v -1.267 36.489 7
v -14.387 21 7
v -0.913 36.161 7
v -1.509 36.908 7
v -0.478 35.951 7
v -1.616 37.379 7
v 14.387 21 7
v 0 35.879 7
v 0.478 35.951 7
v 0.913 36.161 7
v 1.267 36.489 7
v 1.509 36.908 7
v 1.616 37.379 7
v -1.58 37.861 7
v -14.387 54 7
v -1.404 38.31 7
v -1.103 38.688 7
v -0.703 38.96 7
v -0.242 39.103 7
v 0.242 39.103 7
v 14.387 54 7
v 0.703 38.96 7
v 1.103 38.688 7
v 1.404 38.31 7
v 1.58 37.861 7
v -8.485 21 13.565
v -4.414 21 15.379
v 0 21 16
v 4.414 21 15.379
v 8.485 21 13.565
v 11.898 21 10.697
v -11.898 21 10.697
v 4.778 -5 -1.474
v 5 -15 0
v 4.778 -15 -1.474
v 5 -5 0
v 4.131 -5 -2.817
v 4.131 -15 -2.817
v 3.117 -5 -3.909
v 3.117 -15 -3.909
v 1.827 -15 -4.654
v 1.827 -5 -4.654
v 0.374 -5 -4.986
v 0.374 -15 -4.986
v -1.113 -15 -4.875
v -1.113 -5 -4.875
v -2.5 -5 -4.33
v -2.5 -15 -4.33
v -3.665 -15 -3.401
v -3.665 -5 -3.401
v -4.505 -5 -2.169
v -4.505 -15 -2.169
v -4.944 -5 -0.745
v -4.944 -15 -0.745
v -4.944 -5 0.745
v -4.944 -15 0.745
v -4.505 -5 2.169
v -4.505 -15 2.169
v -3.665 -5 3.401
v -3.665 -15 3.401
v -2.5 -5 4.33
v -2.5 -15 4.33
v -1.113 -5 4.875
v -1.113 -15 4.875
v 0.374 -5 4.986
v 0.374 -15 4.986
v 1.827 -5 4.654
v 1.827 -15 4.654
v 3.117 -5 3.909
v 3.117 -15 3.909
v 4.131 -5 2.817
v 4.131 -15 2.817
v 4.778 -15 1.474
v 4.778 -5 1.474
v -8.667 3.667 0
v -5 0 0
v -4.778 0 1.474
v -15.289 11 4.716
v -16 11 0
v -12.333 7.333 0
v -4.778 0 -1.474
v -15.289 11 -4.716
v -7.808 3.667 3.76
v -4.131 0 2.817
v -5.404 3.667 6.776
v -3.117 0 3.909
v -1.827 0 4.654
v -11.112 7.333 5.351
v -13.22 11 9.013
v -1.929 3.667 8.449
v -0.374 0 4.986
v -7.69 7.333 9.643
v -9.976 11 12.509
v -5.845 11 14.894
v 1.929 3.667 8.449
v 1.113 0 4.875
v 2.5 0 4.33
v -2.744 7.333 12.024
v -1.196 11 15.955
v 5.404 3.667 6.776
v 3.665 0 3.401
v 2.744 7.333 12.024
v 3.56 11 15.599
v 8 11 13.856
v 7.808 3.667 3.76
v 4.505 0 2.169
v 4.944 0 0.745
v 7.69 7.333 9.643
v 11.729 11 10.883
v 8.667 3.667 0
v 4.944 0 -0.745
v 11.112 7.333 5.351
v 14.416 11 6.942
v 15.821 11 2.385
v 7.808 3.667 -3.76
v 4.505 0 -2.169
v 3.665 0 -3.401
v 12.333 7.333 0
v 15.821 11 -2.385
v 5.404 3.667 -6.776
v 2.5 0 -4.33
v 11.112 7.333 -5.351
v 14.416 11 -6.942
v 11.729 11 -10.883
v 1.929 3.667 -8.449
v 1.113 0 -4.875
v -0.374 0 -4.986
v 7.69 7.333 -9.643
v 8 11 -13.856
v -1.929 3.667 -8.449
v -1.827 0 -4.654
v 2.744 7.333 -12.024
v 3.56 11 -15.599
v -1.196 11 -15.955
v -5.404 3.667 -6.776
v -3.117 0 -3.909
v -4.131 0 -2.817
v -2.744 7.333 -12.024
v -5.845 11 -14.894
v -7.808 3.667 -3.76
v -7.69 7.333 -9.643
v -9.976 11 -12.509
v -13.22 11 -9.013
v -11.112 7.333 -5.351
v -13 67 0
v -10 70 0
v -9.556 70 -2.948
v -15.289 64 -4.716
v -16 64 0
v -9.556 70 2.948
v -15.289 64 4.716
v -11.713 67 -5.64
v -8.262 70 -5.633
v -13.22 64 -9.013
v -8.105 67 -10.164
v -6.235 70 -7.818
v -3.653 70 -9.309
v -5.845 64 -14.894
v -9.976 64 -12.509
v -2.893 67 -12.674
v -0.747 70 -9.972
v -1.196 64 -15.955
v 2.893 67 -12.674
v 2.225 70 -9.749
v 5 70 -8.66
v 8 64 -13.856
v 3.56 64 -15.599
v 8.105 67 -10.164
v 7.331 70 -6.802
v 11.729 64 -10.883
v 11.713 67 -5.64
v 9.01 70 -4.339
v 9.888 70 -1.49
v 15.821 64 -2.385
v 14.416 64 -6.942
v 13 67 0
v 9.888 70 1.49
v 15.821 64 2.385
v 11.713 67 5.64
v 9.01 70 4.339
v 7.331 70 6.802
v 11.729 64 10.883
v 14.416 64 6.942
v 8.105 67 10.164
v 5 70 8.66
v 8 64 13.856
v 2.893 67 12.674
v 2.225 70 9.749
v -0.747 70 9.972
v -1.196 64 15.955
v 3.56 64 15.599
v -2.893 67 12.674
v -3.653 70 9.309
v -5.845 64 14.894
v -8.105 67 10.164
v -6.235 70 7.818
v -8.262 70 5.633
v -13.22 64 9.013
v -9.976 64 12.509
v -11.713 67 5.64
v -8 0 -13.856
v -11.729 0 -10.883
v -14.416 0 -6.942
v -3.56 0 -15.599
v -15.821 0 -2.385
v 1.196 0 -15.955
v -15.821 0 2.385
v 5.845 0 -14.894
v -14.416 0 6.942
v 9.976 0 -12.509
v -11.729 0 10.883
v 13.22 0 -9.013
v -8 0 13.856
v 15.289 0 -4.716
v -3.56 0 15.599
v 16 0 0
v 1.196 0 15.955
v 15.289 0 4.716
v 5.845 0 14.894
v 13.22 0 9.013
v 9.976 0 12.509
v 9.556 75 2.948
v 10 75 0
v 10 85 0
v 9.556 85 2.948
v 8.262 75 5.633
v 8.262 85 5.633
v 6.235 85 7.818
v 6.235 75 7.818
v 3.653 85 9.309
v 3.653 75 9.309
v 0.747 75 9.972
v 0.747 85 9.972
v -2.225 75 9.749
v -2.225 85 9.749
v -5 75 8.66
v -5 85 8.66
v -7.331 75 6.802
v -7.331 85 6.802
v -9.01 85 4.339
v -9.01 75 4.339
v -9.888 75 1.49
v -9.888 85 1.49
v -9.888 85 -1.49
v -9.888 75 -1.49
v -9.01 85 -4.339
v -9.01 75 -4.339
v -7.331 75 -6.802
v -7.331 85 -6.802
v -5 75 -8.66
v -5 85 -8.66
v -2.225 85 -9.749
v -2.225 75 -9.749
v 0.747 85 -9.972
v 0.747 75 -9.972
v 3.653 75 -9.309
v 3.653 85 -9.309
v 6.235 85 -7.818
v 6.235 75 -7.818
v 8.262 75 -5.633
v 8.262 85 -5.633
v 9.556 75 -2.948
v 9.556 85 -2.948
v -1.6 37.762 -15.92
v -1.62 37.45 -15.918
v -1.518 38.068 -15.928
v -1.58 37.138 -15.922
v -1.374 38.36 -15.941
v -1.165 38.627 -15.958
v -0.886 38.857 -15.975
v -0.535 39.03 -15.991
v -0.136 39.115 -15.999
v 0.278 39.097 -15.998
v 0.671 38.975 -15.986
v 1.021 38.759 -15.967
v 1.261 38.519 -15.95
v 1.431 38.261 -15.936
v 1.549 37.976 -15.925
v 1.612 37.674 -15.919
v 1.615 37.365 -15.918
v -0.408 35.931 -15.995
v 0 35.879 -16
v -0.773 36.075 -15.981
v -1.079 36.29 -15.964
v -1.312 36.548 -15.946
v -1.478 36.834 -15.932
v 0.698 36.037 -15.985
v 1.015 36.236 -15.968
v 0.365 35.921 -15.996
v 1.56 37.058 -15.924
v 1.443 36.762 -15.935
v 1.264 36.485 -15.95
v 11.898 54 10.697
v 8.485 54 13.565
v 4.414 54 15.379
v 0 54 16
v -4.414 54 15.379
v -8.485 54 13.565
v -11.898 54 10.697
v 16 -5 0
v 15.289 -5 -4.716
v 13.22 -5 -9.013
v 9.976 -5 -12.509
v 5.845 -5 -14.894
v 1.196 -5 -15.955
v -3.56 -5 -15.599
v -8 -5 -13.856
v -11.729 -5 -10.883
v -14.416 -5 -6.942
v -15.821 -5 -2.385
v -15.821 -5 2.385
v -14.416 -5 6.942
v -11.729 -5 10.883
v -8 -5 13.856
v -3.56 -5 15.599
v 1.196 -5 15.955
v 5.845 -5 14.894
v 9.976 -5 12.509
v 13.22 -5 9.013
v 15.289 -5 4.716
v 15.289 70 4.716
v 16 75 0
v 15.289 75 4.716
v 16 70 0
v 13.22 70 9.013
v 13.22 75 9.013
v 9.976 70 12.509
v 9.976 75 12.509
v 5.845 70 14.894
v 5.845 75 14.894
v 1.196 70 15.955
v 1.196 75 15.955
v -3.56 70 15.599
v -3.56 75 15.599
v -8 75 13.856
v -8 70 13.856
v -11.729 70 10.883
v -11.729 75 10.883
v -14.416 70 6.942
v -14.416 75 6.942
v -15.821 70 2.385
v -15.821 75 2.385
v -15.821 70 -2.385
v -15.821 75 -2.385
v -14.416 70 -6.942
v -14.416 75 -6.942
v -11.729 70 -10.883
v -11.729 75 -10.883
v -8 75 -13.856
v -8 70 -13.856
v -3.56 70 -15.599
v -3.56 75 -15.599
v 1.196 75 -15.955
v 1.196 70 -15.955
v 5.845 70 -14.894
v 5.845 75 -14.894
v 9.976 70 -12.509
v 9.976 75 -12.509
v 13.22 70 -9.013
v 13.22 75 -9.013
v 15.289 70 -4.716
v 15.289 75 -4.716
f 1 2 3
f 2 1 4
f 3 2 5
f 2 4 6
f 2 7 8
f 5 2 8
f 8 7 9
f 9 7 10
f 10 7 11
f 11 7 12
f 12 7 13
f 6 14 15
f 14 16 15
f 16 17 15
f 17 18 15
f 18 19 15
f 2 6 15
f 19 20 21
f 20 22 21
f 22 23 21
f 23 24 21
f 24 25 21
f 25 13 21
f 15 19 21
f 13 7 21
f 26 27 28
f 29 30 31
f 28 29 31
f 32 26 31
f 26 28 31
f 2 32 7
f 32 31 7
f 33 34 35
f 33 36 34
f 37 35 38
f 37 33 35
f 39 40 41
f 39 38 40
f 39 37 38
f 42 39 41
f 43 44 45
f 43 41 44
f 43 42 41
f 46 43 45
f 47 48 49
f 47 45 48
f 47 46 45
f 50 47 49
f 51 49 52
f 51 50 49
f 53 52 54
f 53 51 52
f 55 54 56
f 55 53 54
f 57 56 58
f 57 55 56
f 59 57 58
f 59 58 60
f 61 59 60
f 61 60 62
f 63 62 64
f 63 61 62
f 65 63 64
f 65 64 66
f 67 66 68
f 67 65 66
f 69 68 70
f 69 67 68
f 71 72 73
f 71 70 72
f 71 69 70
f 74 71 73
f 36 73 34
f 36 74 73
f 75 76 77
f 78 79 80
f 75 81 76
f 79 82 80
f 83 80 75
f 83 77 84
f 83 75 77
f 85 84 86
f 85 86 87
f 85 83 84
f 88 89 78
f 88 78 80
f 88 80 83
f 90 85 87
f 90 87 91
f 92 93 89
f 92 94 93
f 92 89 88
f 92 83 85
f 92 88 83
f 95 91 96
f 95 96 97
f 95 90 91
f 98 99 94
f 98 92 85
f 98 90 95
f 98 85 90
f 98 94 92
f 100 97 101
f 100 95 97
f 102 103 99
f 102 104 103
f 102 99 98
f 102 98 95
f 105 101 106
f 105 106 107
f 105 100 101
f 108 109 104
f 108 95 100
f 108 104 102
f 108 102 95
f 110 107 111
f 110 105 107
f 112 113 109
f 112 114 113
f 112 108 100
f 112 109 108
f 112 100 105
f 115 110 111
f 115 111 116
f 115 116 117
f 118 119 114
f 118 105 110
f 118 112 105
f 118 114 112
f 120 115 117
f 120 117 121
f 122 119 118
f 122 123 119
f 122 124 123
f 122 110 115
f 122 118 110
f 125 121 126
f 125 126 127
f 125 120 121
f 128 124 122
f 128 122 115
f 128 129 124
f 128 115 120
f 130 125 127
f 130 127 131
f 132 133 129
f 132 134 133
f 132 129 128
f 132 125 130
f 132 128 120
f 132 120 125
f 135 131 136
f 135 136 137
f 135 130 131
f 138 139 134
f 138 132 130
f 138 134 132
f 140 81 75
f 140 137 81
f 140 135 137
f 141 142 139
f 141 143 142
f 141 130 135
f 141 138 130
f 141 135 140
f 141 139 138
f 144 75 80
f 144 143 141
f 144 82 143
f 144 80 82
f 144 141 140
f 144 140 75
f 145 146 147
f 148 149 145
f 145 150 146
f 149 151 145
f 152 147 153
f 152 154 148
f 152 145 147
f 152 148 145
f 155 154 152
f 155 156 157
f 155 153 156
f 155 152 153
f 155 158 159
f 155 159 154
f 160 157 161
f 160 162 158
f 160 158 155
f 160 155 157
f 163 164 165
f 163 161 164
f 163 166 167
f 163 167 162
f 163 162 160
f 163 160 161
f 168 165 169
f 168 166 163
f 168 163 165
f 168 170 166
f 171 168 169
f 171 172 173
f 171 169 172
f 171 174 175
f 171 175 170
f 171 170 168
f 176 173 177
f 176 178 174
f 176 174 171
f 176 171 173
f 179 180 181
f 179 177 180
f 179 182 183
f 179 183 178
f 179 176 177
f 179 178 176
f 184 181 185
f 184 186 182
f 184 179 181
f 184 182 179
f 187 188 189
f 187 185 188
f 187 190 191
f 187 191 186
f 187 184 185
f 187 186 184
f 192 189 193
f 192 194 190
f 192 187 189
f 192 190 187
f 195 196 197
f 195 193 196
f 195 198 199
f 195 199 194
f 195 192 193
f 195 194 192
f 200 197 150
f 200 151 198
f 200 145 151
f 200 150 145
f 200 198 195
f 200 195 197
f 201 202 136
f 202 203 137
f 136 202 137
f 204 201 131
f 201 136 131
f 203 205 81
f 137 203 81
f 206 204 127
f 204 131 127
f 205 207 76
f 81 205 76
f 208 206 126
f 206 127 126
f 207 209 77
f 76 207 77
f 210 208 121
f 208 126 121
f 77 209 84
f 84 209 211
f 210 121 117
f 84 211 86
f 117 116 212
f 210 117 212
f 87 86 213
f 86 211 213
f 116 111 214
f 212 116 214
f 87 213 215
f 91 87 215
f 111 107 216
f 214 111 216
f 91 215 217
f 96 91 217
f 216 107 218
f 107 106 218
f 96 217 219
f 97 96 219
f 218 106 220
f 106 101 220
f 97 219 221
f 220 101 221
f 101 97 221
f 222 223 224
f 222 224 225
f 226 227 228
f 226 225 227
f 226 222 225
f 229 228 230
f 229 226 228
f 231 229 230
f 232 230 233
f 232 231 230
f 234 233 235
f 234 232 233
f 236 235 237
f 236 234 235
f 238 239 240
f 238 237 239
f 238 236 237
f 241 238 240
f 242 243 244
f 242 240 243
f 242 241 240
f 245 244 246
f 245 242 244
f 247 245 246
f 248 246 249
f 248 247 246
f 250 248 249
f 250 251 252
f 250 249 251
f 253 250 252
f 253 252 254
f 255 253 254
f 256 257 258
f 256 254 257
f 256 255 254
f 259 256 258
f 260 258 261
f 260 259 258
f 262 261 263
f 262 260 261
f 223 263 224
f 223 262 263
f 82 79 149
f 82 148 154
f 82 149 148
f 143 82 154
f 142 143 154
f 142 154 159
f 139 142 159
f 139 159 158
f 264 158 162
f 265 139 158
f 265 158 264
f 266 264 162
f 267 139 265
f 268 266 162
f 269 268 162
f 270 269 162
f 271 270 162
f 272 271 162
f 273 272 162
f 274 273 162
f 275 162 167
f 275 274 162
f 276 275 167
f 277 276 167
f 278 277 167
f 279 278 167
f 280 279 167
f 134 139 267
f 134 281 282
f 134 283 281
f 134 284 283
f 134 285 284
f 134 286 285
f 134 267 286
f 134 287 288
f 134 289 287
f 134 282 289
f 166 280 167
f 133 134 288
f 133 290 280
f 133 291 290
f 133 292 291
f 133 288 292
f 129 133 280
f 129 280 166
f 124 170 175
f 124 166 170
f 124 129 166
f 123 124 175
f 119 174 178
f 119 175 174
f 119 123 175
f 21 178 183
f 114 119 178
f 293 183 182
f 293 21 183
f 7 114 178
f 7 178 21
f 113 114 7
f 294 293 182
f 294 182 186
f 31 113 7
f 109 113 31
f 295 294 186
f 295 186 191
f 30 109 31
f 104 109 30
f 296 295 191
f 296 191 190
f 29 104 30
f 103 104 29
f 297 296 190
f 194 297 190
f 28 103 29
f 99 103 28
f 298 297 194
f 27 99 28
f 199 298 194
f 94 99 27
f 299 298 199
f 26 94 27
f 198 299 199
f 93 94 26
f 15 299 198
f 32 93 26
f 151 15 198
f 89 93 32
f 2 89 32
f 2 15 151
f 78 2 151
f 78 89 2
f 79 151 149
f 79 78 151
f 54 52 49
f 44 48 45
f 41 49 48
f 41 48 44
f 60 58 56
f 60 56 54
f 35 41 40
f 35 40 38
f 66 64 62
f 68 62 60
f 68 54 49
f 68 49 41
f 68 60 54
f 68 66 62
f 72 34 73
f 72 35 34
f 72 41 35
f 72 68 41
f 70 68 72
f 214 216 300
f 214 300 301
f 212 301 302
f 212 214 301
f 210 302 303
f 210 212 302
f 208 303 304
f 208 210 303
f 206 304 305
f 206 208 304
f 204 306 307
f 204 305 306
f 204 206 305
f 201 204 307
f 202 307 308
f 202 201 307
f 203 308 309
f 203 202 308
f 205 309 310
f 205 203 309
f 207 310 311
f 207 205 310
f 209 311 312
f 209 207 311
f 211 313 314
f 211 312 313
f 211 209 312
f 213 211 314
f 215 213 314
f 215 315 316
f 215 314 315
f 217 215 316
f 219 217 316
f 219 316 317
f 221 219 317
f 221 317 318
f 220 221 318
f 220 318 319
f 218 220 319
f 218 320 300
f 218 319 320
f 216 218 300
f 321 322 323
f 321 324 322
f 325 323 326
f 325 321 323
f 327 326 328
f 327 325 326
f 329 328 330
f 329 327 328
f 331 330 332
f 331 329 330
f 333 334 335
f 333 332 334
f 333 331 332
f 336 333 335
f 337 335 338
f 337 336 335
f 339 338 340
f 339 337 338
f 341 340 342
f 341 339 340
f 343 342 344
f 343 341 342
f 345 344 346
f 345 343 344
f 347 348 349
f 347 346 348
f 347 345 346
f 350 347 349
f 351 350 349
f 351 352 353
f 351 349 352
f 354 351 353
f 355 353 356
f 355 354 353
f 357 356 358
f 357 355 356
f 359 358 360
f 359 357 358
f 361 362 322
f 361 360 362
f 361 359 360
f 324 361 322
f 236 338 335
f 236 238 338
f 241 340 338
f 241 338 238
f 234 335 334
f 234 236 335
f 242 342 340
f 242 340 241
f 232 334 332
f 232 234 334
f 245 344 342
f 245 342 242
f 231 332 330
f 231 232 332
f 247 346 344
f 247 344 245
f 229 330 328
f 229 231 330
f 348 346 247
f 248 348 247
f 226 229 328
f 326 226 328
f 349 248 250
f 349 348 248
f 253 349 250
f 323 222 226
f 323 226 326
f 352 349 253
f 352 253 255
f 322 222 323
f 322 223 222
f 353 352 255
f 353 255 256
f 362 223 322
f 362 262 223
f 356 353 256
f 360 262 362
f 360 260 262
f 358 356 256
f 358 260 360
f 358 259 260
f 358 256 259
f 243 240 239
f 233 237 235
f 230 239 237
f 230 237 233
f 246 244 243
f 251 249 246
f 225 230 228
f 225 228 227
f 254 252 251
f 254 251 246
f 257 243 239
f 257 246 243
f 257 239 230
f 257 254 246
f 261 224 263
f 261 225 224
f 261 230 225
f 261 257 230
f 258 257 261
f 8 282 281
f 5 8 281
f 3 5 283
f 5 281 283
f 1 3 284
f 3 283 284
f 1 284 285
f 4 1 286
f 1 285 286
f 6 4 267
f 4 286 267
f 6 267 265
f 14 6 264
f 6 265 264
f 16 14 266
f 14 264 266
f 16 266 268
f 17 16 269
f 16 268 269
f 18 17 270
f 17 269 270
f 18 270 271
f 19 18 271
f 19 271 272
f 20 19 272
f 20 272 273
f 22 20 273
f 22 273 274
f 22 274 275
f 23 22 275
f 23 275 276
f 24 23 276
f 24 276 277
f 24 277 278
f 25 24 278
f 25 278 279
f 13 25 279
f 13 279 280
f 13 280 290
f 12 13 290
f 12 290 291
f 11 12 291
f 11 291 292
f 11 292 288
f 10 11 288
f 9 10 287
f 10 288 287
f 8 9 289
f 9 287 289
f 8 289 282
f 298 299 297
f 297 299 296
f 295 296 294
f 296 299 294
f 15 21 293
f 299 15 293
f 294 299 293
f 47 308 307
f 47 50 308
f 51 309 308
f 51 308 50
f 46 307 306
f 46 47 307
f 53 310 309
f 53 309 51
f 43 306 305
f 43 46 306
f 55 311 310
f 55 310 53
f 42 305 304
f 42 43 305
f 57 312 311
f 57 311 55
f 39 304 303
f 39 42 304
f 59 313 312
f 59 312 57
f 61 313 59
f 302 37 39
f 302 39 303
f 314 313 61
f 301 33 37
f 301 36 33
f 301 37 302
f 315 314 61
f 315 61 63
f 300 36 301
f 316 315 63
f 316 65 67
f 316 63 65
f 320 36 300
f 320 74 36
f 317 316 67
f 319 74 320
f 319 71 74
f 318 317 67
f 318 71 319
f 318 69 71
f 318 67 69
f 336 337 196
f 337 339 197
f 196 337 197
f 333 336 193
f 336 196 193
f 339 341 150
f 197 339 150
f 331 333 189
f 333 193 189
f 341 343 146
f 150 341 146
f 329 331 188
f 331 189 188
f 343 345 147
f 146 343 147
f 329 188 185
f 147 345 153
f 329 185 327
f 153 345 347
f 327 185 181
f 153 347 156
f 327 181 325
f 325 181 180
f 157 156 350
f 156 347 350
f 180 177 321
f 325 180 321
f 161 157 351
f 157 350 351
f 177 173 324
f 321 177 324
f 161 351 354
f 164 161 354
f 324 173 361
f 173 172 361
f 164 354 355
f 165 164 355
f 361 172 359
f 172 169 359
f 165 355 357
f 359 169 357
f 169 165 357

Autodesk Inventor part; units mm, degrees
ref_plane "XZ Plane" through (0, 0, 0) normal (0, 1, 0) x (-1, 0, 0)
ref_plane "XY Plane" through (0, 0, 0) normal (0, 0, 1) x (1, 0, 0)
sketch "Sketch1" plane through (0, 0, 0) normal (0, 1, 0) x (-1, 0, 0)
  circle A0 centre (0, 0) radius 16
  dimension "d0" = 32
extrude "Extrusion1" add sketch "Sketch1" along normal blind 70
chamfer "Chamfer1" distance 6 angle 45 1 edges at (16, 70, 0)
chamfer "Chamfer2" distance 11 angle 45 1 edges at (16, 0, 0)
sketch "Sketch2" plane through (0, 70, 0) normal (0, 1, 0) x (1, 0, 0)
  circle A0 centre (0, 0) radius 16
extrude "Extrusion2" add sketch "Sketch2" along normal blind 5
sketch "Sketch3" plane through (0, 0, 0) normal (0, -1, 0) x (1, 0, 0)
  circle A0 centre (0, 0) radius 16
extrude "Extrusion3" add sketch "Sketch3" along normal blind 5
sketch "Sketch4" plane through (0, -5, 0) normal (0, -1, 0) x (1, 0, 0)
  circle A0 centre (0, 0) radius 5
extrude "Extrusion4" add sketch "Sketch4" along normal blind 10
sketch "Sketch5" plane through (0, 75, 0) normal (0, 1, 0) x (1, 0, 0)
  circle A0 centre (0, 0) radius 10
extrude "Extrusion5" add sketch "Sketch5" along normal blind 10
ref_plane "Work Plane1" through (16, 0, 0) normal (1, 0, 0) x (0, 1, 0)
sketch "Sketch6" plane through (16, 0, 0) normal (1, 0, 0) x (0, 1, 0)
  line L0 (11, 16) -> (11, -16) projected
  line L1 (11, 0) -> (21, 0)
  line L2 (21, 0) -> (21, 7)
  line L3 (11, 16) -> (64, 16) projected
  line L4 (21, 7) -> (54, 7)
  line L5 (54, 7) -> (54, 16)
  line L6 (54, 16) -> (21, 16)
  line L7 (21, 16) -> (21, 7)
  point P0 (0, 0)
  dimension "d17" = 10
  dimension "d18" = 7
  dimension "d19" = 33
extrude "Extrusion6" cut sketch "Sketch6" against normal through all contours L3 L5 L4 L7
sketch "Sketch7" plane through (-14.3875, 21, 7) normal (0, 0, 1) x (1, 0, 0)
  line L0 (28.775, 0) -> (0, 0) projected
  line L1 (14.3875, 0) -> (14.3875, 16.5)
  point P0 (14.3875, -21)
  dimension "d22" = 16.5
hole "Hole1" at (0, 37.5, 7) direction (0, 0, -1) diameter 3.242 end through all thread size "M4x0.7" class "6H" standard "ANSI Metric M Profile"
properties part number "MMAE 232 Assignment 1e-Nicholas Skiba" material "Aluminum 6061"
